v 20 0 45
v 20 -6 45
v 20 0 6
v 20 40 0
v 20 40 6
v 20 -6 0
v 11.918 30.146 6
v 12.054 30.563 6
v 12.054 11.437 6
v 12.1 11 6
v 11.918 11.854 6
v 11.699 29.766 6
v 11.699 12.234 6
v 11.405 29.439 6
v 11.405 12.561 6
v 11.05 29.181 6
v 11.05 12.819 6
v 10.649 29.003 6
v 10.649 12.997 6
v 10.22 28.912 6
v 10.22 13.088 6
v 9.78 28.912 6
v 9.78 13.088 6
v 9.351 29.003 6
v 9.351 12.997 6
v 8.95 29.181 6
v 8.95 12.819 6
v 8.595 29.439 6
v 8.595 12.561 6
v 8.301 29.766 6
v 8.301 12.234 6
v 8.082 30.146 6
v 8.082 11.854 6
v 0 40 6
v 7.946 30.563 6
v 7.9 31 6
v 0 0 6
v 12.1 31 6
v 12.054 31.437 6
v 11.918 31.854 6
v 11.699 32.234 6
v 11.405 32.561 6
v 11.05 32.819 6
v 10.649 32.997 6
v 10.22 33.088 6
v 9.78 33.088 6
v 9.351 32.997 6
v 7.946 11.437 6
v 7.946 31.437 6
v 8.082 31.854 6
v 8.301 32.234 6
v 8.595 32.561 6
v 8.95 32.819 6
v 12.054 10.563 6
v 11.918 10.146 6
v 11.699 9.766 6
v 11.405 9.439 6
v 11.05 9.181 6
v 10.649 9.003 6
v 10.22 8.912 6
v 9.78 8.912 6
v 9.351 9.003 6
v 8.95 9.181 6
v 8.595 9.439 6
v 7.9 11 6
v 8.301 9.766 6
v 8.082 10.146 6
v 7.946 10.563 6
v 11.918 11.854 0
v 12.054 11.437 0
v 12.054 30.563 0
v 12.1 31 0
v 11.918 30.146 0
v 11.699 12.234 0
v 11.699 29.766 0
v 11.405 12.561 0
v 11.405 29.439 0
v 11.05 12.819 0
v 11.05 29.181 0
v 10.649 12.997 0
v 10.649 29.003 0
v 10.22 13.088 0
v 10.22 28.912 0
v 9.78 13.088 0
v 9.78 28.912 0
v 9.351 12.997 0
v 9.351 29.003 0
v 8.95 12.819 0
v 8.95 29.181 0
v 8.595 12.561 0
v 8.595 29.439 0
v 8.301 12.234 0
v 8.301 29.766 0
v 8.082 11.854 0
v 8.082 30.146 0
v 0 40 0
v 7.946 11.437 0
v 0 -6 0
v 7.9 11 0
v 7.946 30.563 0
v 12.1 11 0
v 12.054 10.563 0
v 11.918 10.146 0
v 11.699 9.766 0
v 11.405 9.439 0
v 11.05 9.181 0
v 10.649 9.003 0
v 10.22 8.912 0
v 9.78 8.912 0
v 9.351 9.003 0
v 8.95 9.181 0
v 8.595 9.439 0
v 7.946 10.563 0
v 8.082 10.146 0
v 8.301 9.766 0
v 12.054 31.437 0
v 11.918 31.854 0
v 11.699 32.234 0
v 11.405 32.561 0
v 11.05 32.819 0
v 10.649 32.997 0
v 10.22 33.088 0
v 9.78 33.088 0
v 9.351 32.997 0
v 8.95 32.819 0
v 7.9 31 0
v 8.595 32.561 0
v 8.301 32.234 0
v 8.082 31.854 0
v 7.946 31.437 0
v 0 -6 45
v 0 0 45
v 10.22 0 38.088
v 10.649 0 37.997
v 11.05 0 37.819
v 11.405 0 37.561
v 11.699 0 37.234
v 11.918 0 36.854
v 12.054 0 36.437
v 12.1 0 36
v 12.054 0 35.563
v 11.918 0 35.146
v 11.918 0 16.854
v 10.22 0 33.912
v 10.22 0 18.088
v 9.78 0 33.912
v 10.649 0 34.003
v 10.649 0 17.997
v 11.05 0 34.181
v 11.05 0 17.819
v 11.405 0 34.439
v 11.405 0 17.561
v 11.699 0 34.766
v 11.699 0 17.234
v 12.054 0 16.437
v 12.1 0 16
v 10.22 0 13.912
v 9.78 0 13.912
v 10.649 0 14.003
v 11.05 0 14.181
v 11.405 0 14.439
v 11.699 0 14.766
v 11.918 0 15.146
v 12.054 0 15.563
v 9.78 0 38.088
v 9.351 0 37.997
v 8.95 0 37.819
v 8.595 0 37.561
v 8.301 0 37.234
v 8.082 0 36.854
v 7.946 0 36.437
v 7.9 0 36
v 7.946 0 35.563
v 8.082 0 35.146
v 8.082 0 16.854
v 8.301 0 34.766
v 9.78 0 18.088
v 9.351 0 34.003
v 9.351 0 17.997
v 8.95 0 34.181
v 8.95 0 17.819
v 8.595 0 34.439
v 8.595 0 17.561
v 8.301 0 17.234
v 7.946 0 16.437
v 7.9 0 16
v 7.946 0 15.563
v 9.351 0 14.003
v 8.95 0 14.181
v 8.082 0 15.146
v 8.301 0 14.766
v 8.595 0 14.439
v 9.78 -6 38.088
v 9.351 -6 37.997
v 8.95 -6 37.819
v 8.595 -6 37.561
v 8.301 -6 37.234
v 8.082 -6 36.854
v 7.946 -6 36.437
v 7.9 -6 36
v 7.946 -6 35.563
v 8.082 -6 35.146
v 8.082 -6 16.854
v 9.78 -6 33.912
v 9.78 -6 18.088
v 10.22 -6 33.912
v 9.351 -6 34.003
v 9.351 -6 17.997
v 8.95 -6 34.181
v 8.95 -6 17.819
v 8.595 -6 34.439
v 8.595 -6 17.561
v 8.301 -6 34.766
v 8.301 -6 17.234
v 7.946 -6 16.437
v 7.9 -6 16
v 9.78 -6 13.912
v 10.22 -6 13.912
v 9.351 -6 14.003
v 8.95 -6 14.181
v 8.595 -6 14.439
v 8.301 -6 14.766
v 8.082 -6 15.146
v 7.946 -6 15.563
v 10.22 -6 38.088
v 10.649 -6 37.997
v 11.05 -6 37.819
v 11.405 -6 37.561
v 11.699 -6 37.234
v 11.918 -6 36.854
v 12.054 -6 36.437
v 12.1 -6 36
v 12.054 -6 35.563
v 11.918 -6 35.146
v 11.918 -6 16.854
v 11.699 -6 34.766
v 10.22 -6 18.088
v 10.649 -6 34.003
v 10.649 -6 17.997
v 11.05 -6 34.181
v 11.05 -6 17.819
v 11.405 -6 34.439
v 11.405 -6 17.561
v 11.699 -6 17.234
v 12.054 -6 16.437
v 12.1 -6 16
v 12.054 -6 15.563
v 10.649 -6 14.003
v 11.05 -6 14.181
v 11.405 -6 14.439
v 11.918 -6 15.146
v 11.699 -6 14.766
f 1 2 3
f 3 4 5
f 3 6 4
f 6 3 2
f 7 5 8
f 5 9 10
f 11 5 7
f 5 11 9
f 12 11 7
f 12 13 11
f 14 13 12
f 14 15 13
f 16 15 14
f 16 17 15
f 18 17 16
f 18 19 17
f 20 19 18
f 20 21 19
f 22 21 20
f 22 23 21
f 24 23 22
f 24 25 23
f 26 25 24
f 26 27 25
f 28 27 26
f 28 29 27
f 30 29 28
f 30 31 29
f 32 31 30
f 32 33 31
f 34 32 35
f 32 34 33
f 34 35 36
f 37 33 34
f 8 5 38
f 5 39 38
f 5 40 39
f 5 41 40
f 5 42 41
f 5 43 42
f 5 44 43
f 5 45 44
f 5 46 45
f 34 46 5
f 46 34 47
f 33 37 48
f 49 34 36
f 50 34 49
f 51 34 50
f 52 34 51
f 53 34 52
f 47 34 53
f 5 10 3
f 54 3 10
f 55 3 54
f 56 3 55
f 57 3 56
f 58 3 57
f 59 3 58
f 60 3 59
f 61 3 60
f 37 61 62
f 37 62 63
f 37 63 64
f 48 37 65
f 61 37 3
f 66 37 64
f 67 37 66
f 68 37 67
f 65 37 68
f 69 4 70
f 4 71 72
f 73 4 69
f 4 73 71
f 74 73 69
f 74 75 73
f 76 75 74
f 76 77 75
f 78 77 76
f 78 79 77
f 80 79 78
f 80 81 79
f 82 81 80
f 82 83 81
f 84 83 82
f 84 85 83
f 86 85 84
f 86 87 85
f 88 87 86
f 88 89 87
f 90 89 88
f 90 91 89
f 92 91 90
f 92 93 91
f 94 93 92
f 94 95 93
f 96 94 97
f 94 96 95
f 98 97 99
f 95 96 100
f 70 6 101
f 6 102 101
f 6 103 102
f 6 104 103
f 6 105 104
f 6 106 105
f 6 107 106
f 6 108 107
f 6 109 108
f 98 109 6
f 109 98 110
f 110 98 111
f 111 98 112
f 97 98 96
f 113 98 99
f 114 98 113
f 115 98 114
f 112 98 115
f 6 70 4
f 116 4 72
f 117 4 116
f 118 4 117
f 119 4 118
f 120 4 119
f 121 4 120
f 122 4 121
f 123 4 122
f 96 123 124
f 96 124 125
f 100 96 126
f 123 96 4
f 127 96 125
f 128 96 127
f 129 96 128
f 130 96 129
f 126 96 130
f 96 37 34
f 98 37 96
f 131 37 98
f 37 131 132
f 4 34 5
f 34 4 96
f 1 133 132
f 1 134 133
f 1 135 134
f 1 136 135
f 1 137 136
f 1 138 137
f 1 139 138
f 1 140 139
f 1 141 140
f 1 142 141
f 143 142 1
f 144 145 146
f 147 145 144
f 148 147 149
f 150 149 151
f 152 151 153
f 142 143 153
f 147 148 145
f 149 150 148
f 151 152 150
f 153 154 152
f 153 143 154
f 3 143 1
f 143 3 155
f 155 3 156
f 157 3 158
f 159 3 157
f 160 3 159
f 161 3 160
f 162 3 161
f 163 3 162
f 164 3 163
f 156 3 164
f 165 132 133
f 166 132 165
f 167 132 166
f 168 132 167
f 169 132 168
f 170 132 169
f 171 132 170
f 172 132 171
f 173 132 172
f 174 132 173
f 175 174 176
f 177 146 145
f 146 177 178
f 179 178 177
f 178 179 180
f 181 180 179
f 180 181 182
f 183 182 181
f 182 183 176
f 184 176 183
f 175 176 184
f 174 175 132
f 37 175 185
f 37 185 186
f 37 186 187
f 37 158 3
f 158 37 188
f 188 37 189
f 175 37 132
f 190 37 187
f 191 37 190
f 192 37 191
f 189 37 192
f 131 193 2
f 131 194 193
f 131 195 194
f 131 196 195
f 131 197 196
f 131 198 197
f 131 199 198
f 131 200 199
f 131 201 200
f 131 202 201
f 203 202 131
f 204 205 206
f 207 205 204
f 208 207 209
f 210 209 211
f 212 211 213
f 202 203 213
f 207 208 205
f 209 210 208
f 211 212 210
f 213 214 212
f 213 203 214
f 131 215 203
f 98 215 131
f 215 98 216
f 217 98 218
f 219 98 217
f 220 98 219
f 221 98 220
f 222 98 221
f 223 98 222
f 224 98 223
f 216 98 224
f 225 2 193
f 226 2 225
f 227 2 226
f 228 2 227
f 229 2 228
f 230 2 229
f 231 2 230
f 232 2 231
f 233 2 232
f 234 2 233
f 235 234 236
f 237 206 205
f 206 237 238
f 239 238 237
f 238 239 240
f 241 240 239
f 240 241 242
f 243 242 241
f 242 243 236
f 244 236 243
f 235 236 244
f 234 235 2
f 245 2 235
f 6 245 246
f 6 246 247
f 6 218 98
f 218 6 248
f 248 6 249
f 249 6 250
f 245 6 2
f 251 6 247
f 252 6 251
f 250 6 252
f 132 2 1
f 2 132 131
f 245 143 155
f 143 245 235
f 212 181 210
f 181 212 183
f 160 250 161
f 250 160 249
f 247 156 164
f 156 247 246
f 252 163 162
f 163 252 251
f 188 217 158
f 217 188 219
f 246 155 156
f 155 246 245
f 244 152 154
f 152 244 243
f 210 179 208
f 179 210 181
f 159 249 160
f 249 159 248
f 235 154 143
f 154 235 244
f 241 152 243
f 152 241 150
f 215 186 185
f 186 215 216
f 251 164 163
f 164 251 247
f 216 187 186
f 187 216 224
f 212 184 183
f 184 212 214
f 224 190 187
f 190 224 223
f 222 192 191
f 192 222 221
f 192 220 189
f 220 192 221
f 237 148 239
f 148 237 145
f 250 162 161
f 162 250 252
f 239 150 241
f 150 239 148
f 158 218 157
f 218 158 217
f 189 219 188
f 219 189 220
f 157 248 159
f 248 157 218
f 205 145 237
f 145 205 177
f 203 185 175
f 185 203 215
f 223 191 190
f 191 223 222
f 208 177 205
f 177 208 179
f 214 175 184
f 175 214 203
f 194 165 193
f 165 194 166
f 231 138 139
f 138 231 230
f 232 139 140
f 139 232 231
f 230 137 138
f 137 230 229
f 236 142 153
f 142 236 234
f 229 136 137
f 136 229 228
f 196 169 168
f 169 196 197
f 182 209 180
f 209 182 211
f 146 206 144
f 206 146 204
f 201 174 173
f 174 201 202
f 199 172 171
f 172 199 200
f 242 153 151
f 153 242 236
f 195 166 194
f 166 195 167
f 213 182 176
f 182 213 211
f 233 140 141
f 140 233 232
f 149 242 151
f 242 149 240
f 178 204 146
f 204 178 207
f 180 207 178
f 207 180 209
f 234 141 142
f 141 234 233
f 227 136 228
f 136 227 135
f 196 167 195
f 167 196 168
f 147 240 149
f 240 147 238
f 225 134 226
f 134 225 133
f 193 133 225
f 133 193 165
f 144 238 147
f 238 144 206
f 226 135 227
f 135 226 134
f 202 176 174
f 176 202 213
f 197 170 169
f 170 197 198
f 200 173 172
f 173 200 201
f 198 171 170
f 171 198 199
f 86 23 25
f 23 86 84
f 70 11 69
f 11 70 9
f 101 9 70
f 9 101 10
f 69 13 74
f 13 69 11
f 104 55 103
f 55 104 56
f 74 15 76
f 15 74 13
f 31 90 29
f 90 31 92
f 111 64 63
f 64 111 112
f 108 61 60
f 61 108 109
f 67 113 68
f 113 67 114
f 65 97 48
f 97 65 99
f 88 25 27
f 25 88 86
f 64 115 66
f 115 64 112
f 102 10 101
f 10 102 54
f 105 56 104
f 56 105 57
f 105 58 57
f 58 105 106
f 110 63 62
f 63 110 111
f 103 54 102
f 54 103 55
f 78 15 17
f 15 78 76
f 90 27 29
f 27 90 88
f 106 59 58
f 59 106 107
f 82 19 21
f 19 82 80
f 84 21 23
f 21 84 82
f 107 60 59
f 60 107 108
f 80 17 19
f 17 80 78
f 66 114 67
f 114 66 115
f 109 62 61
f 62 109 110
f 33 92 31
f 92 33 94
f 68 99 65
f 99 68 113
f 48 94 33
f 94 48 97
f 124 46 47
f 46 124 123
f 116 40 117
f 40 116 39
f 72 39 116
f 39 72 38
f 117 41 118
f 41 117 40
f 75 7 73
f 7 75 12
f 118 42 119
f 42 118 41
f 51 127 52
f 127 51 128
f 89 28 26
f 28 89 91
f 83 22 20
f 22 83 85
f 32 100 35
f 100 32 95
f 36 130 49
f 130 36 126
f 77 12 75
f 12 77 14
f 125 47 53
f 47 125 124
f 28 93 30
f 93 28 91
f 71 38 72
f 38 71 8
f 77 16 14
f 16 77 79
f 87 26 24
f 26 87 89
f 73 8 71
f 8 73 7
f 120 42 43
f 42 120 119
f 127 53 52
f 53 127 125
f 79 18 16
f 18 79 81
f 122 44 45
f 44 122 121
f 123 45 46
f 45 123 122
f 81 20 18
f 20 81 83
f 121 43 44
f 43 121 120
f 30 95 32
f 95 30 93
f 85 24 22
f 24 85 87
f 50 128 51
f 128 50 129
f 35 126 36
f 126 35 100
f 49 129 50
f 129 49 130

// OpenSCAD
// file: functions.scad
// PRUSA Mendel  
// Functions used in many files
// GNU GPL v2
// Josef Průša
// josefprusa@me.com
// prusadjs.cz
// http://www.reprap.org/wiki/Prusa_Mendel
// http://github.com/prusajr/PrusaMendel

module nut(d,h,horizontal=true){
cornerdiameter =  (d / 2) / cos (180 / 6);
cylinder(h = h, r = cornerdiameter, $fn = 6);
if(horizontal){
for(i = [1:6]){
	rotate([0,0,60*i]) translate([-cornerdiameter-0.2,0,0]) rotate([0,0,-45]) cube(size = [2,2,h]);
}}
}

// By nophead
module polyhole(d,h) {
    n = max(round(2 * d),3);
    rotate([0,0,180])
        cylinder(h = h, r = (d / 2) / cos (180 / n), $fn = n);
}

module roundcorner(diameter){
	difference(){
		cube(size = [diameter,diameter,99], center = false);
		translate(v = [diameter, diameter, 0]) cylinder(h = 100, r=diameter, center=true);
	}
}
// file: metric.scad
// PRUSA Mendel  
// Default metric sizes
// GNU GPL v2
// Josef Průša
// josefprusa@me.com
// prusadjs.cz
// http://www.reprap.org/wiki/Prusa_Mendel
// http://github.com/prusajr/PrusaMendel

// DONT CHANGE THIS FILE! ALTER VALUES IN CONFIGURATION.SCAD INSTEAD

// RODS

threaded_rod_diameter = 8;
threaded_rod_diameter_horizontal = 8;
smooth_bar_diameter = 8;
smooth_bar_diameter_horizontal = 8;

// Nuts and bolts

m8_diameter = 8;
m8_nut_diameter = 14.5;

m4_diameter = 4;
m4_nut_diameter = 7.5;

m3_diameter = 3;
m3_nut_diameter = 5;

// Bushing holder

bushing_core_diameter = smooth_bar_diameter;
bushing_material_thickness = 1;

// Motors

motor_shaft = 5.1;
// file: configuration.scad
// PRUSA Mendel  
// Configuration file
// GNU GPL v2
// Josef Průša
// josefprusa@me.com
// prusadjs.cz
// http://www.reprap.org/wiki/Prusa_Mendel
// http://github.com/prusajr/PrusaMendel

// PLEASE SELECT ONE OF THE CONFIGURATIONS BELOW
// BY UN-COMMENTING IT

// Uncomment for metric settings
// METRIC METRIC METRIC METRIC METRIC METRIC METRIC METRIC 

include <metric.scad>;

// Uncomment for imperial settings
// IMPERIAL IMPERIAL IMPERIAL IMPERIAL IMPERIAL IMPERIAL IMPERIAL 

//include <sae.scad>;

//thin_wall = 3;
// LM8UU
//linear = false;

// override settings by customizing below
// CUSTOM CUSTOM CUSTOM CUSTOM CUSTOM CUSTOM CUSTOM CUSTOM CUSTOM

threaded_rod_diameter = 8.2;
threaded_rod_diameter_horizontal = 8.2;
smooth_bar_diameter = 8.3;
smooth_bar_diameter_horizontal = 8.3;

// Nuts and bolts

m8_diameter = 8.3;
m8_nut_diameter = 15;

m4_diameter = 4.2;
m4_nut_diameter = 9;

m3_diameter = 3.3;
m3_nut_diameter = 5.8;

///counted stuff
m3_nut_diameter_bigger = ((m3_nut_diameter  / 2) / cos (180 / 6))*2;

// functions 
include <functions.scad>
// main file
// F. Beachler, Longevity Software LLC. d.b.a. Terawatt Industries

include <configuration.scad>;

thickness = 6;   // wall and base thickness
slottabs = 2;    // Slot depth (2 is normal) -1 to remove tabs
holes = m4_diameter;  //m3, m4 or m5=5.1
o = 0.1;						// overlap amount for error-free STLs

$fn=30;

for (x = [0])
{
	translate([(x*25),0,0]) prism60inside_hotext(thickness,slottabs,holes);
}

module prism60inside_hotext(th,st,hs)
{
	difference() {
		union() {
			cube([20, 40, 6]);
			rotate([90, 0, 0]) cube([20, 45, 6]);
		}
		translate([10, 5 + th, -0.1]) cylinder(r=hs / 2,h=th + 2*o);
		translate([10, 25 + th, -0.1]) cylinder(r=hs / 2,h=th + 2*o);
		rotate([90, 0, 0]) {
			translate([10, 10 + th, -0.1]) cylinder(r=hs / 2,h=th + 2*o);
			translate([10, 30 + th, -0.1]) cylinder(r=hs / 2,h=th + 2*o);
		}
	}
}
